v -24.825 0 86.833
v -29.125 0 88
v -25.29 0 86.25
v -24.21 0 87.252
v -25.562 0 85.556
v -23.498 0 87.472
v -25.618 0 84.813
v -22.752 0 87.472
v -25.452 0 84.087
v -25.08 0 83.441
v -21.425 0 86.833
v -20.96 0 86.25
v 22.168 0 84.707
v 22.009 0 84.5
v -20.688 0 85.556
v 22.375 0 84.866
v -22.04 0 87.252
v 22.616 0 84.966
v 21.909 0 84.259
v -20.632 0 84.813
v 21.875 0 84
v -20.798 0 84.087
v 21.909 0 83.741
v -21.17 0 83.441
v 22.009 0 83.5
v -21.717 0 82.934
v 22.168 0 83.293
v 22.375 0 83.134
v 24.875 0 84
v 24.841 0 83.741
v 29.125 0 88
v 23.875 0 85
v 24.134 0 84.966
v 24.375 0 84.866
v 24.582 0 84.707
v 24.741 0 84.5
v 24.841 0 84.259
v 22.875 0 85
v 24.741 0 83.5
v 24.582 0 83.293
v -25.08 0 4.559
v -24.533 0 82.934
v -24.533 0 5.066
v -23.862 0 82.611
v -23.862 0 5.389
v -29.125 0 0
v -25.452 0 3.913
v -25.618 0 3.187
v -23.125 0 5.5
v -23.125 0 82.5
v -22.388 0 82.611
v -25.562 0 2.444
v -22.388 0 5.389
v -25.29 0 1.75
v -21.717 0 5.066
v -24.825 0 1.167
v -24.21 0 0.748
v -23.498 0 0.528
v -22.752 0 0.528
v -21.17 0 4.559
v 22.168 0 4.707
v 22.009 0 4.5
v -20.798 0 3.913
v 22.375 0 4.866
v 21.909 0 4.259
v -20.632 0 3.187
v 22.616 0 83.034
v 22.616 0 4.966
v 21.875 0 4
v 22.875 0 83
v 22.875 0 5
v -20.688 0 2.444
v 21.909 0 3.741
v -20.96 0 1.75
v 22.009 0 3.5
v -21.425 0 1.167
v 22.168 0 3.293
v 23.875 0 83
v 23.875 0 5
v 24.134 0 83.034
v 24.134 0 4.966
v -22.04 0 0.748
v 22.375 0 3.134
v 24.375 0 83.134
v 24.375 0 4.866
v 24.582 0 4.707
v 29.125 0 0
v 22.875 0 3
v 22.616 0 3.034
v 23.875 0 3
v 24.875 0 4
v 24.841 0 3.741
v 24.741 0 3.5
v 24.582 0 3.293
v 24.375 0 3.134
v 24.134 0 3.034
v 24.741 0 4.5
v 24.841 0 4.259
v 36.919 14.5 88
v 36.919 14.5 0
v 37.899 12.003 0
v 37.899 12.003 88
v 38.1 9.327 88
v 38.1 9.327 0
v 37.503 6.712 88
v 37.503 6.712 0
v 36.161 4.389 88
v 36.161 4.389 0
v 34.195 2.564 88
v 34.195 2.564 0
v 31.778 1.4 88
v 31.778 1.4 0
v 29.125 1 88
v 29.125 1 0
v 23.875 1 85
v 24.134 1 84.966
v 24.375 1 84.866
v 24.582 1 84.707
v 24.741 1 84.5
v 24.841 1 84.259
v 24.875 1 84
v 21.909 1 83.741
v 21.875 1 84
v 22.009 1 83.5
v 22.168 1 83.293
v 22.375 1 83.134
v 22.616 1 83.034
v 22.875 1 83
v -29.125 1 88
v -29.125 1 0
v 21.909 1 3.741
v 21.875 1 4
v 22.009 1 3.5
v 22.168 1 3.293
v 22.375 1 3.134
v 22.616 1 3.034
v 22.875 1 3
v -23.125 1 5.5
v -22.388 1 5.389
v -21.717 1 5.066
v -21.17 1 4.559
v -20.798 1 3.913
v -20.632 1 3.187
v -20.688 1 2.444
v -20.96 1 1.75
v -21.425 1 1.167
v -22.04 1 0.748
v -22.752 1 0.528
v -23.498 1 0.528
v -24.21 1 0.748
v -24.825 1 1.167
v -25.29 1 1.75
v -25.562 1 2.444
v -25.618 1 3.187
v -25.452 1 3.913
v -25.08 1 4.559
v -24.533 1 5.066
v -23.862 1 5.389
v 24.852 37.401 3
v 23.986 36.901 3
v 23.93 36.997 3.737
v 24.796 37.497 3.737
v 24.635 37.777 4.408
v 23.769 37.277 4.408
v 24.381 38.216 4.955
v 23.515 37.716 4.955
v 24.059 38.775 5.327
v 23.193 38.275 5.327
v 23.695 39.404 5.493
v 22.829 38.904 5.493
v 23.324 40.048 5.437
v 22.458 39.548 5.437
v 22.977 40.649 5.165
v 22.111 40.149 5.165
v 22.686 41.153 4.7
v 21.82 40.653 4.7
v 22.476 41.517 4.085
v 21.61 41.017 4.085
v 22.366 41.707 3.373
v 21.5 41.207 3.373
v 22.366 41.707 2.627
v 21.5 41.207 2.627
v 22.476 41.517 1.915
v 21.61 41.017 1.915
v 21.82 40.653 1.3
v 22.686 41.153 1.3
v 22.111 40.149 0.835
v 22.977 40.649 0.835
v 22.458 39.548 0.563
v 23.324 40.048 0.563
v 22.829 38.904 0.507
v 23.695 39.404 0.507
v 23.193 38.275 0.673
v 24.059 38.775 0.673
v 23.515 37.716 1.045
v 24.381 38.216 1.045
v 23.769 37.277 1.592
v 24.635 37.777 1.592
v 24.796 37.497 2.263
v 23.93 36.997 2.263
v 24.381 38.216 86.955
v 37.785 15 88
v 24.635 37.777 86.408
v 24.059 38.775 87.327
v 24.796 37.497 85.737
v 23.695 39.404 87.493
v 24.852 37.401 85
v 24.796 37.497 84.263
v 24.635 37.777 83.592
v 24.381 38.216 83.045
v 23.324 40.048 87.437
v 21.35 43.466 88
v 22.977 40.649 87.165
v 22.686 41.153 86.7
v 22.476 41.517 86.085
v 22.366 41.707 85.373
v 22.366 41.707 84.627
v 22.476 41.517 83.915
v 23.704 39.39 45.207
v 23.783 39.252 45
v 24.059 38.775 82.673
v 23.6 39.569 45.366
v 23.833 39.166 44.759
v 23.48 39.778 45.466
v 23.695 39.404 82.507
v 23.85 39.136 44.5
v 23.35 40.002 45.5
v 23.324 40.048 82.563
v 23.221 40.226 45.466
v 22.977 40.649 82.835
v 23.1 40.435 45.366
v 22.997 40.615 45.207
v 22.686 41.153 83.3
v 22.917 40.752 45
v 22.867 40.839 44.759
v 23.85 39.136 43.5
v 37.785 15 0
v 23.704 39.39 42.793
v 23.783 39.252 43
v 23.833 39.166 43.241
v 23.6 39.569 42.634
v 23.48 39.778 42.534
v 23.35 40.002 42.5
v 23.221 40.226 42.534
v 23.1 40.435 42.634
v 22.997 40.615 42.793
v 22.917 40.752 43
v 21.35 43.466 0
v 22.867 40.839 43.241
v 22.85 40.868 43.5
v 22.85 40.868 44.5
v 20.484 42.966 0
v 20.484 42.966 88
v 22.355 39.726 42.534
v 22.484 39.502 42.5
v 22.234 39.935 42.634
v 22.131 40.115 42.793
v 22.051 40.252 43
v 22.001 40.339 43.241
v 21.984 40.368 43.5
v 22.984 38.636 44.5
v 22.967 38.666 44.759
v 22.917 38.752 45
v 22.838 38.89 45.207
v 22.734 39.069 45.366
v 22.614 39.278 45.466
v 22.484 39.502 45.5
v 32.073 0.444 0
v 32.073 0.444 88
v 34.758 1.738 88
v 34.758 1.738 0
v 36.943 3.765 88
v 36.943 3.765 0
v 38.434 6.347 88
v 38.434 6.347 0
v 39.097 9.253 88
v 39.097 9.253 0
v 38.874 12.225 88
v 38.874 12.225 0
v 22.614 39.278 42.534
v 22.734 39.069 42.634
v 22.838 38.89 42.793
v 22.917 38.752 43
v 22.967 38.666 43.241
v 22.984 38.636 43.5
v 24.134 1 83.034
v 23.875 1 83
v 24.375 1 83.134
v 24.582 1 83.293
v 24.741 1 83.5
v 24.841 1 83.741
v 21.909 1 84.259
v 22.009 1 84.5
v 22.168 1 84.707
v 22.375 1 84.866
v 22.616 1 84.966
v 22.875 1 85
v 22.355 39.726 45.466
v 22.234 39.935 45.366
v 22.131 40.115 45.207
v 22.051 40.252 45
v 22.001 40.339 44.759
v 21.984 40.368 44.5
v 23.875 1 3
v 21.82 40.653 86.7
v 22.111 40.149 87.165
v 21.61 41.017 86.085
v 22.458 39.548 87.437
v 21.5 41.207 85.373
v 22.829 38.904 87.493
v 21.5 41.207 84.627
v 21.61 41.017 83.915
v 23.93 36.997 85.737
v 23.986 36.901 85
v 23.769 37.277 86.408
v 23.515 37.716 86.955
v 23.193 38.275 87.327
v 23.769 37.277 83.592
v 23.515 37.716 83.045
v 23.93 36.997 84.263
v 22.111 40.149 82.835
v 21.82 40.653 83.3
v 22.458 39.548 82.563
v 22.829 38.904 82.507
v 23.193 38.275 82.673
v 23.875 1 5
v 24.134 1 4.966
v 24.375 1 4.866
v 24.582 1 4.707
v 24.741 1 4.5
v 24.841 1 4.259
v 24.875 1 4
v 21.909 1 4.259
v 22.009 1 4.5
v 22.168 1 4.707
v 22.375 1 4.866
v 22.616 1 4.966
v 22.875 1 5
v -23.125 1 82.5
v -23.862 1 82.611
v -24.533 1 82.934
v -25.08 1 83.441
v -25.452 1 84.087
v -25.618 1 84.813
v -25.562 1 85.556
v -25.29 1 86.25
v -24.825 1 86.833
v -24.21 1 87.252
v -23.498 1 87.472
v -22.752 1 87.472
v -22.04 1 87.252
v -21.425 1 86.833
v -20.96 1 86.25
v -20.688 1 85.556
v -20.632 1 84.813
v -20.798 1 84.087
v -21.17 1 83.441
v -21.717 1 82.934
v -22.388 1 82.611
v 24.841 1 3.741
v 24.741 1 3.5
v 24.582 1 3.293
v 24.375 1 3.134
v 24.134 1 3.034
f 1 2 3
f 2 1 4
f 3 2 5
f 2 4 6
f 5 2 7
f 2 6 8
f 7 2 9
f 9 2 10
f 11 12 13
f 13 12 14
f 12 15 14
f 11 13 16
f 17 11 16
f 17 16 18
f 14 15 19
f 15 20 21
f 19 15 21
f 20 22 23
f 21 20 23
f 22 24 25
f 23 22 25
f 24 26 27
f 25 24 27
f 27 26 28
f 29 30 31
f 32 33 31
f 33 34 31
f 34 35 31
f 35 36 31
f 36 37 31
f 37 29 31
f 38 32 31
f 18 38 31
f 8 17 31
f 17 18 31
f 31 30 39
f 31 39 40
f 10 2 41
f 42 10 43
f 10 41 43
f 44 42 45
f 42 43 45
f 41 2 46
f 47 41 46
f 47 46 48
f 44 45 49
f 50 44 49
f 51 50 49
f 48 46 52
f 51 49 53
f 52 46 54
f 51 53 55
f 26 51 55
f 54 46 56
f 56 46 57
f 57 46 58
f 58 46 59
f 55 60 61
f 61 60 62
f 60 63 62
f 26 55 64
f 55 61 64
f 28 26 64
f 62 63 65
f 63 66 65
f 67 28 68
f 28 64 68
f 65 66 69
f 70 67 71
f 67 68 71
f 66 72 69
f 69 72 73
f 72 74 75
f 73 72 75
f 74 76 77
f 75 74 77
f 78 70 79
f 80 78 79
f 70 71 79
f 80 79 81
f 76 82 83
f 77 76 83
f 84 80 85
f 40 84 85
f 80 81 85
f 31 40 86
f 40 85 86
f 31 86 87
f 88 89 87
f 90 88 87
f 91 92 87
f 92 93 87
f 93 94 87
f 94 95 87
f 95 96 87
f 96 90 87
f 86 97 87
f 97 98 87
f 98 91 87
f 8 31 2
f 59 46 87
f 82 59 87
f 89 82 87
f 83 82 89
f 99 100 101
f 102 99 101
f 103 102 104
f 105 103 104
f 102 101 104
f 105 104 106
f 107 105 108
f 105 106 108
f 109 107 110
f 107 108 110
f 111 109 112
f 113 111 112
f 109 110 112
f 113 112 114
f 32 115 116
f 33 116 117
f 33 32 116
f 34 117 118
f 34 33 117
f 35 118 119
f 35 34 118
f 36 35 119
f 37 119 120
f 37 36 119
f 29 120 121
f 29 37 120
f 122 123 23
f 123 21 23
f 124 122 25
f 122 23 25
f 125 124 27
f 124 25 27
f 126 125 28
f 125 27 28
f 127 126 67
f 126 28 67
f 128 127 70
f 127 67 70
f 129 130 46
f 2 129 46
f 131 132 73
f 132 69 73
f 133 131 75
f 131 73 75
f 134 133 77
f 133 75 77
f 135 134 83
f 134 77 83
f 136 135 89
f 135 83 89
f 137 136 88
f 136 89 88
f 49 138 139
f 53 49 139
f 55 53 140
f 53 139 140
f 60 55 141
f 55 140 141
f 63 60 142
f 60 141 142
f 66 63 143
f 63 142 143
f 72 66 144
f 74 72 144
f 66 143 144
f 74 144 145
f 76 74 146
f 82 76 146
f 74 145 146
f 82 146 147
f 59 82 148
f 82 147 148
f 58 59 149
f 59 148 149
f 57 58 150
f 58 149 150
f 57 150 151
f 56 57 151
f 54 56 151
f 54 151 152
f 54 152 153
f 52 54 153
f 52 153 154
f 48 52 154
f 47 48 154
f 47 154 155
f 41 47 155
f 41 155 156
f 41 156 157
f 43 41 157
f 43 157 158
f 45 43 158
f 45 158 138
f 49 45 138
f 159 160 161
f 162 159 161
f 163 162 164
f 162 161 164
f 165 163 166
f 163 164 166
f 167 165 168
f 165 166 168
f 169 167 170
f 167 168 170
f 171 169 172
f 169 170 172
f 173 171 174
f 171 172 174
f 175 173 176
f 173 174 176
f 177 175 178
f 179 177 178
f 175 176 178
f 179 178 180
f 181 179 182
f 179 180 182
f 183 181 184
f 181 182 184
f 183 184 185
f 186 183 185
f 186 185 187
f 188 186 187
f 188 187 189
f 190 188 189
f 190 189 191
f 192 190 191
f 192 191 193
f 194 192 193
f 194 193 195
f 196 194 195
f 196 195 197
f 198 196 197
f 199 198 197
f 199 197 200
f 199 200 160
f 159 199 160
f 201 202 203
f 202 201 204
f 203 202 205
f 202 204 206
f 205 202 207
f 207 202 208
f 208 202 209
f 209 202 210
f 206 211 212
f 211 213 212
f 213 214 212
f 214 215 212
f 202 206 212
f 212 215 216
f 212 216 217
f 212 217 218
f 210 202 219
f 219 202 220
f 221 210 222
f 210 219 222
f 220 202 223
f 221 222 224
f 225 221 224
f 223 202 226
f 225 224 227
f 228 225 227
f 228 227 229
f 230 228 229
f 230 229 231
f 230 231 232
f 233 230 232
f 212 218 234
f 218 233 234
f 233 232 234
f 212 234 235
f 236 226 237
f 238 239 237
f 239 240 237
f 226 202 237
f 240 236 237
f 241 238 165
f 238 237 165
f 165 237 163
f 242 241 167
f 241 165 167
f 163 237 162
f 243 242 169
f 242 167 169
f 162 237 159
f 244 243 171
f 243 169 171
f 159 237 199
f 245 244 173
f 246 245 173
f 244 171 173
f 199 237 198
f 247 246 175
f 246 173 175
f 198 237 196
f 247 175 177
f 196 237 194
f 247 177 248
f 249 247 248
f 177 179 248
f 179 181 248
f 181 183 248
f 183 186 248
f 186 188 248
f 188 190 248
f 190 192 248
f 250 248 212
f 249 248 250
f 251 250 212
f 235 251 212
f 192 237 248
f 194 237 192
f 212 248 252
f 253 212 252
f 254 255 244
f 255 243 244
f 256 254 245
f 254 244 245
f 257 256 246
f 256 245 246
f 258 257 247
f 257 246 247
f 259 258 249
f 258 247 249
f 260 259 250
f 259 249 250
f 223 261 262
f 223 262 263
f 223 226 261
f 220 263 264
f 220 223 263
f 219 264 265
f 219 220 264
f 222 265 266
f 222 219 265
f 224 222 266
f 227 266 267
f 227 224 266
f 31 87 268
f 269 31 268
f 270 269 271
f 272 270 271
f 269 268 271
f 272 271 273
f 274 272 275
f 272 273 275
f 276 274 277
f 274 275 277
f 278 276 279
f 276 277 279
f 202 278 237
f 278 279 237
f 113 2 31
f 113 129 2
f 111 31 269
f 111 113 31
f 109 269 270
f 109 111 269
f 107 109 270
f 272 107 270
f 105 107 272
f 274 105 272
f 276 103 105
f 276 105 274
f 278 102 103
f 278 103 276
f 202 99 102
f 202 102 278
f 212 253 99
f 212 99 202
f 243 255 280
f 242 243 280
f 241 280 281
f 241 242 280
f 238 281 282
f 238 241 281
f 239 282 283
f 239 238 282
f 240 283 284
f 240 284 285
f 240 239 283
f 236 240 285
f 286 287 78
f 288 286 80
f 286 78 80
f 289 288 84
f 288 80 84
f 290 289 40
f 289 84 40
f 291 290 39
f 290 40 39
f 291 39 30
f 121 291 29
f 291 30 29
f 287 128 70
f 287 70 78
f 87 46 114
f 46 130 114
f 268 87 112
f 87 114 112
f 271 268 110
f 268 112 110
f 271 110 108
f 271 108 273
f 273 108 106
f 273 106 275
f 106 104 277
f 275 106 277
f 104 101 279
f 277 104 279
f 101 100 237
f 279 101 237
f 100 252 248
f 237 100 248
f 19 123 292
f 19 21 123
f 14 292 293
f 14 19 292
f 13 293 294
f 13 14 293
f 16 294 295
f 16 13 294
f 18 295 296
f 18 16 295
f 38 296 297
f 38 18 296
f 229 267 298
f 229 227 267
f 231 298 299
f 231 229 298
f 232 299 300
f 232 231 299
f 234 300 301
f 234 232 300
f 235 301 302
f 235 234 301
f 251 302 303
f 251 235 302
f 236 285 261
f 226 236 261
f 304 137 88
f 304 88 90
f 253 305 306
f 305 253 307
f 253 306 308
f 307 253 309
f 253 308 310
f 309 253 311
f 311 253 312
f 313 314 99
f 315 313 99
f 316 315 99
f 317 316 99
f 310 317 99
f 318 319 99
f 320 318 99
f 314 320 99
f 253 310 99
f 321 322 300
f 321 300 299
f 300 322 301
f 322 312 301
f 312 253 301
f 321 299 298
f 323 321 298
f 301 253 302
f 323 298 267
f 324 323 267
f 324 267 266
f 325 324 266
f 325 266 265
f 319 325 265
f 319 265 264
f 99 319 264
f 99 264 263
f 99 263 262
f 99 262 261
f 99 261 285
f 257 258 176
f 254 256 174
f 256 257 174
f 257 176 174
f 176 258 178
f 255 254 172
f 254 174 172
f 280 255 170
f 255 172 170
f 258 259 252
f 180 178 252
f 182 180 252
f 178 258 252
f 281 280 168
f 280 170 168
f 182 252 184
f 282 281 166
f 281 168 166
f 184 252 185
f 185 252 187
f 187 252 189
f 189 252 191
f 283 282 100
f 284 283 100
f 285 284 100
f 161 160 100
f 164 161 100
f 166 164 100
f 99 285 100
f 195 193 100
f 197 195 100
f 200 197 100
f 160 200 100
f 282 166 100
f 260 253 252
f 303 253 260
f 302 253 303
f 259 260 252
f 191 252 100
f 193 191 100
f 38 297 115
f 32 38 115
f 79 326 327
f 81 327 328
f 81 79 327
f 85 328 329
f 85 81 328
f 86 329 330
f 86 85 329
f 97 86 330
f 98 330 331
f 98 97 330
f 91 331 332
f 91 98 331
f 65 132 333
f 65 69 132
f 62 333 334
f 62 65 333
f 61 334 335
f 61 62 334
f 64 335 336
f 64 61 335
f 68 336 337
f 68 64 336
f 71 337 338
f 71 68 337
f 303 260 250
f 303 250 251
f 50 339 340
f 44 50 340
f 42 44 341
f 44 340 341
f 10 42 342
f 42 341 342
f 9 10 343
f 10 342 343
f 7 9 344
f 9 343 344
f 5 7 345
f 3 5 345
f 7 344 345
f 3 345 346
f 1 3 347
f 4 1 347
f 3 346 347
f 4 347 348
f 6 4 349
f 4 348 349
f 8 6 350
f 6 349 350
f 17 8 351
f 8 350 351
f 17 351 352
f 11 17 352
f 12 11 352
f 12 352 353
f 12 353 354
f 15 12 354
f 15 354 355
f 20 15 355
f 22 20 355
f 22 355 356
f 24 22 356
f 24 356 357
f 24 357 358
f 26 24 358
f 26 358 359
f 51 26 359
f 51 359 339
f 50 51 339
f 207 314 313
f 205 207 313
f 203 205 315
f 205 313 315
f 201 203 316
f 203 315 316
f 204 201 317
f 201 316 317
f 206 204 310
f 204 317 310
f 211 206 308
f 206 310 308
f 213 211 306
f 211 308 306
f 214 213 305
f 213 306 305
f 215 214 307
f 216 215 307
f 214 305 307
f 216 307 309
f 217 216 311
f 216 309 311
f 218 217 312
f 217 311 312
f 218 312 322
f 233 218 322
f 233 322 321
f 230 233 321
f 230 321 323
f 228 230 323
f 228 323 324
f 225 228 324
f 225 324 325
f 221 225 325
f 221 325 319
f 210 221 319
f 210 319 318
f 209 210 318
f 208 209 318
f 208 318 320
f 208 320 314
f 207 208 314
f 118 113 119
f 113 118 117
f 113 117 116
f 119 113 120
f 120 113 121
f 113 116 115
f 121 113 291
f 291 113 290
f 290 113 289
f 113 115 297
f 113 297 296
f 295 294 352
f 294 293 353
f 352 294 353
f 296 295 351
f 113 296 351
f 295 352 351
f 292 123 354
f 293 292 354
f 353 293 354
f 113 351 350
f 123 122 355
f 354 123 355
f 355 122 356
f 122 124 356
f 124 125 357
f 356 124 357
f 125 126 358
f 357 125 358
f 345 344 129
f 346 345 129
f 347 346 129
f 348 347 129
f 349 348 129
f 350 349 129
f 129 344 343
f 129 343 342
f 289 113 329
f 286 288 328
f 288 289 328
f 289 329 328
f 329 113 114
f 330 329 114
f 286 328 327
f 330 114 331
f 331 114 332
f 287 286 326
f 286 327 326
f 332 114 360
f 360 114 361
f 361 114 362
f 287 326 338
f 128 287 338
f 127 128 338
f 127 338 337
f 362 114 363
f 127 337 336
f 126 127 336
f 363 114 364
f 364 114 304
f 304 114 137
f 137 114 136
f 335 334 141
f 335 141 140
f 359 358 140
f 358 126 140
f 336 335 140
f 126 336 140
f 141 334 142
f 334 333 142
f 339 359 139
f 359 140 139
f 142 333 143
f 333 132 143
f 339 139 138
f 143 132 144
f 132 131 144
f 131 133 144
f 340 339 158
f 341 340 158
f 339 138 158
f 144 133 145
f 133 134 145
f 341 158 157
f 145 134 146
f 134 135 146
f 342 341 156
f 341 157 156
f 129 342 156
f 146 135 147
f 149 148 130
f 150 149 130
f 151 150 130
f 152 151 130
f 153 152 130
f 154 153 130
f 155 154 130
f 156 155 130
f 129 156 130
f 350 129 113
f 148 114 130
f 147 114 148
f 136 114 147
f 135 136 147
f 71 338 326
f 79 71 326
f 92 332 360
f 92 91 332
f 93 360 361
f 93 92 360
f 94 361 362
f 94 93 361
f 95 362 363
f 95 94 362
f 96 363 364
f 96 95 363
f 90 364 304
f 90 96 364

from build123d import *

# Parameters (mm, degrees)
BASE_DEPTH                 = 88
SZKIC3_R                   = 2.5
HOLES_DEPTH                = 106.252783529
WYTNIJ_WYCI_GNI_CIE1_REACH = 107.253
SZKIC6_W                   = 3
SZKIC6_H                   = 2
WYTNIJ_WYCI_GNI_CIE3_REACH = 112.877
SZKIC7_R                   = 2.5
WYTNIJ_WYCI_GNI_CIE4_REACH = 112.877
SZKIC8_W                   = 3
SZKIC8_H                   = 2
ZAOKR_GLENIE1_R            = 1


with BuildPart() as part:
    # Szkic1 → base (new body)
    with BuildSketch(Plane.XY):
        with BuildLine():
            Line((-29.125, 0), (29.125, 0))
            ThreePointArc((29.125, 0), (37.785254038, 5), (37.785254038, 15))
            Line((37.785254038, 15), (21.350254038, 43.466255022))
            Line((21.350254038, 43.466255022), (20.484228634, 42.966255022))
            Line((20.484228634, 42.966255022), (36.919228634, 14.5))
            ThreePointArc((36.919228634, 14.5), (36.919228634, 5.5), (29.125, 1))
            Line((29.125, 1), (-29.125, 1))
            Line((-29.125, 1), (-29.125, 0))
        make_face()
    extrude(amount=BASE_DEPTH)

    # Szkic3 → holes (cut, through all)
    with BuildSketch(Plane(origin=(0, 1, 0), x_dir=(1, 0, 0), z_dir=(0, 1, 0))):
        with Locations(Location((-23.125, -3, 0), (0, 0, 270))):
            Circle(SZKIC3_R)
        with Locations(Location((-23.125, -85, 0), (0, 0, 90))):
            Circle(SZKIC3_R)
    extrude(amount=-HOLES_DEPTH, mode=Mode.SUBTRACT)

    # Szkic6 → Wytnij-wyciągnięcie1 (cut, up to next)
    with BuildSketch(Plane(origin=(0, 1, 0), x_dir=(1, 0, 0), z_dir=(0, 1, 0)), mode=Mode.PRIVATE) as wytnij_wyci_gni_cie1_sk1:
        with Locations((23.375, -84)):
            Rectangle(SZKIC6_W, SZKIC6_H)
    wytnij_wyci_gni_cie1_tool1 = extrude(wytnij_wyci_gni_cie1_sk1.sketch, amount=-WYTNIJ_WYCI_GNI_CIE1_REACH, mode=Mode.PRIVATE) & part.part
    # Szkic6 → Wytnij-wyciągnięcie1 (cut, up to next)
    with BuildSketch(Plane(origin=(0, 1, 0), x_dir=(1, 0, 0), z_dir=(0, 1, 0)), mode=Mode.PRIVATE) as wytnij_wyci_gni_cie1_sk2:
        with Locations((23.375, -4)):
            Rectangle(SZKIC6_W, SZKIC6_H)
    wytnij_wyci_gni_cie1_tool2 = extrude(wytnij_wyci_gni_cie1_sk2.sketch, amount=-WYTNIJ_WYCI_GNI_CIE1_REACH, mode=Mode.PRIVATE) & part.part
    add(wytnij_wyci_gni_cie1_tool1.solids().sort_by_distance((23.375, 1, 84))[0], mode=Mode.SUBTRACT)
    add(wytnij_wyci_gni_cie1_tool2.solids().sort_by_distance((23.375, 1, 4))[0], mode=Mode.SUBTRACT)

    # Szkic7 → Wytnij-wyciągnięcie3 (cut, up to next)
    with BuildSketch(Plane(origin=(33.968105653, 19.611494943, 0), x_dir=(0, 0, 1), z_dir=(-0.8660254037844387, -0.5000000000000001, 0)), mode=Mode.PRIVATE) as wytnij_wyci_gni_cie3_sk1:
        with Locations(Location((85, 22.464423789, 0), (0, 0, 270))):
            Circle(SZKIC7_R)
    wytnij_wyci_gni_cie3_tool1 = extrude(wytnij_wyci_gni_cie3_sk1.sketch, amount=-WYTNIJ_WYCI_GNI_CIE3_REACH, mode=Mode.PRIVATE) & part.part
    # Szkic7 → Wytnij-wyciągnięcie3 (cut, up to next)
    with BuildSketch(Plane(origin=(33.968105653, 19.611494943, 0), x_dir=(0, 0, 1), z_dir=(-0.8660254037844387, -0.5000000000000001, 0)), mode=Mode.PRIVATE) as wytnij_wyci_gni_cie3_sk2:
        with Locations(Location((3, 22.464423789, 0), (0, 0, 270))):
            Circle(SZKIC7_R)
    wytnij_wyci_gni_cie3_tool2 = extrude(wytnij_wyci_gni_cie3_sk2.sketch, amount=-WYTNIJ_WYCI_GNI_CIE3_REACH, mode=Mode.PRIVATE) & part.part
    add(wytnij_wyci_gni_cie3_tool1.solids().sort_by_distance((22.735894, 39.066257, 85))[0], mode=Mode.SUBTRACT)
    add(wytnij_wyci_gni_cie3_tool2.solids().sort_by_distance((22.735894, 39.066257, 3))[0], mode=Mode.SUBTRACT)

    # Szkic8 → Wytnij-wyciągnięcie4 (cut, up to next)
    with BuildSketch(Plane(origin=(33.968105653, 19.611494943, 0), x_dir=(0, 0, 1), z_dir=(-0.8660254037844387, -0.5000000000000001, 0)), mode=Mode.PRIVATE) as wytnij_wyci_gni_cie4_sk1:
        with Locations((44, 22.967754038)):
            Rectangle(SZKIC8_W, SZKIC8_H)
    wytnij_wyci_gni_cie4_tool1 = extrude(wytnij_wyci_gni_cie4_sk1.sketch, amount=-WYTNIJ_WYCI_GNI_CIE4_REACH, mode=Mode.PRIVATE) & part.part
    add(wytnij_wyci_gni_cie4_tool1.solids().sort_by_distance((22.484229, 39.502153, 44))[0], mode=Mode.SUBTRACT)

    # Zaokrąglenie1
    zaokr_glenie1_edges = [part.edges().sort_by_distance(p)[0] for p in [
        (22.417241336, 40.618178811, 42.5),
        (23.417241336, 38.886128003, 42.5),
        (22.417241336, 40.618178811, 45.5),
        (23.417241336, 38.886128003, 45.5),
        (21.875, 0.5, 85),
        (24.875, 0.5, 83),
        (24.875, 0.5, 85),
        (21.875, 0.5, 83),
        (21.875, 0.5, 3),
        (21.875, 0.5, 5),
        (24.875, 0.5, 3),
        (24.875, 0.5, 5),
    ]]
    fillet(zaokr_glenie1_edges, radius=ZAOKR_GLENIE1_R - 0.0001)  # a hair under: the kernel refuses the full size


solid = part.part
